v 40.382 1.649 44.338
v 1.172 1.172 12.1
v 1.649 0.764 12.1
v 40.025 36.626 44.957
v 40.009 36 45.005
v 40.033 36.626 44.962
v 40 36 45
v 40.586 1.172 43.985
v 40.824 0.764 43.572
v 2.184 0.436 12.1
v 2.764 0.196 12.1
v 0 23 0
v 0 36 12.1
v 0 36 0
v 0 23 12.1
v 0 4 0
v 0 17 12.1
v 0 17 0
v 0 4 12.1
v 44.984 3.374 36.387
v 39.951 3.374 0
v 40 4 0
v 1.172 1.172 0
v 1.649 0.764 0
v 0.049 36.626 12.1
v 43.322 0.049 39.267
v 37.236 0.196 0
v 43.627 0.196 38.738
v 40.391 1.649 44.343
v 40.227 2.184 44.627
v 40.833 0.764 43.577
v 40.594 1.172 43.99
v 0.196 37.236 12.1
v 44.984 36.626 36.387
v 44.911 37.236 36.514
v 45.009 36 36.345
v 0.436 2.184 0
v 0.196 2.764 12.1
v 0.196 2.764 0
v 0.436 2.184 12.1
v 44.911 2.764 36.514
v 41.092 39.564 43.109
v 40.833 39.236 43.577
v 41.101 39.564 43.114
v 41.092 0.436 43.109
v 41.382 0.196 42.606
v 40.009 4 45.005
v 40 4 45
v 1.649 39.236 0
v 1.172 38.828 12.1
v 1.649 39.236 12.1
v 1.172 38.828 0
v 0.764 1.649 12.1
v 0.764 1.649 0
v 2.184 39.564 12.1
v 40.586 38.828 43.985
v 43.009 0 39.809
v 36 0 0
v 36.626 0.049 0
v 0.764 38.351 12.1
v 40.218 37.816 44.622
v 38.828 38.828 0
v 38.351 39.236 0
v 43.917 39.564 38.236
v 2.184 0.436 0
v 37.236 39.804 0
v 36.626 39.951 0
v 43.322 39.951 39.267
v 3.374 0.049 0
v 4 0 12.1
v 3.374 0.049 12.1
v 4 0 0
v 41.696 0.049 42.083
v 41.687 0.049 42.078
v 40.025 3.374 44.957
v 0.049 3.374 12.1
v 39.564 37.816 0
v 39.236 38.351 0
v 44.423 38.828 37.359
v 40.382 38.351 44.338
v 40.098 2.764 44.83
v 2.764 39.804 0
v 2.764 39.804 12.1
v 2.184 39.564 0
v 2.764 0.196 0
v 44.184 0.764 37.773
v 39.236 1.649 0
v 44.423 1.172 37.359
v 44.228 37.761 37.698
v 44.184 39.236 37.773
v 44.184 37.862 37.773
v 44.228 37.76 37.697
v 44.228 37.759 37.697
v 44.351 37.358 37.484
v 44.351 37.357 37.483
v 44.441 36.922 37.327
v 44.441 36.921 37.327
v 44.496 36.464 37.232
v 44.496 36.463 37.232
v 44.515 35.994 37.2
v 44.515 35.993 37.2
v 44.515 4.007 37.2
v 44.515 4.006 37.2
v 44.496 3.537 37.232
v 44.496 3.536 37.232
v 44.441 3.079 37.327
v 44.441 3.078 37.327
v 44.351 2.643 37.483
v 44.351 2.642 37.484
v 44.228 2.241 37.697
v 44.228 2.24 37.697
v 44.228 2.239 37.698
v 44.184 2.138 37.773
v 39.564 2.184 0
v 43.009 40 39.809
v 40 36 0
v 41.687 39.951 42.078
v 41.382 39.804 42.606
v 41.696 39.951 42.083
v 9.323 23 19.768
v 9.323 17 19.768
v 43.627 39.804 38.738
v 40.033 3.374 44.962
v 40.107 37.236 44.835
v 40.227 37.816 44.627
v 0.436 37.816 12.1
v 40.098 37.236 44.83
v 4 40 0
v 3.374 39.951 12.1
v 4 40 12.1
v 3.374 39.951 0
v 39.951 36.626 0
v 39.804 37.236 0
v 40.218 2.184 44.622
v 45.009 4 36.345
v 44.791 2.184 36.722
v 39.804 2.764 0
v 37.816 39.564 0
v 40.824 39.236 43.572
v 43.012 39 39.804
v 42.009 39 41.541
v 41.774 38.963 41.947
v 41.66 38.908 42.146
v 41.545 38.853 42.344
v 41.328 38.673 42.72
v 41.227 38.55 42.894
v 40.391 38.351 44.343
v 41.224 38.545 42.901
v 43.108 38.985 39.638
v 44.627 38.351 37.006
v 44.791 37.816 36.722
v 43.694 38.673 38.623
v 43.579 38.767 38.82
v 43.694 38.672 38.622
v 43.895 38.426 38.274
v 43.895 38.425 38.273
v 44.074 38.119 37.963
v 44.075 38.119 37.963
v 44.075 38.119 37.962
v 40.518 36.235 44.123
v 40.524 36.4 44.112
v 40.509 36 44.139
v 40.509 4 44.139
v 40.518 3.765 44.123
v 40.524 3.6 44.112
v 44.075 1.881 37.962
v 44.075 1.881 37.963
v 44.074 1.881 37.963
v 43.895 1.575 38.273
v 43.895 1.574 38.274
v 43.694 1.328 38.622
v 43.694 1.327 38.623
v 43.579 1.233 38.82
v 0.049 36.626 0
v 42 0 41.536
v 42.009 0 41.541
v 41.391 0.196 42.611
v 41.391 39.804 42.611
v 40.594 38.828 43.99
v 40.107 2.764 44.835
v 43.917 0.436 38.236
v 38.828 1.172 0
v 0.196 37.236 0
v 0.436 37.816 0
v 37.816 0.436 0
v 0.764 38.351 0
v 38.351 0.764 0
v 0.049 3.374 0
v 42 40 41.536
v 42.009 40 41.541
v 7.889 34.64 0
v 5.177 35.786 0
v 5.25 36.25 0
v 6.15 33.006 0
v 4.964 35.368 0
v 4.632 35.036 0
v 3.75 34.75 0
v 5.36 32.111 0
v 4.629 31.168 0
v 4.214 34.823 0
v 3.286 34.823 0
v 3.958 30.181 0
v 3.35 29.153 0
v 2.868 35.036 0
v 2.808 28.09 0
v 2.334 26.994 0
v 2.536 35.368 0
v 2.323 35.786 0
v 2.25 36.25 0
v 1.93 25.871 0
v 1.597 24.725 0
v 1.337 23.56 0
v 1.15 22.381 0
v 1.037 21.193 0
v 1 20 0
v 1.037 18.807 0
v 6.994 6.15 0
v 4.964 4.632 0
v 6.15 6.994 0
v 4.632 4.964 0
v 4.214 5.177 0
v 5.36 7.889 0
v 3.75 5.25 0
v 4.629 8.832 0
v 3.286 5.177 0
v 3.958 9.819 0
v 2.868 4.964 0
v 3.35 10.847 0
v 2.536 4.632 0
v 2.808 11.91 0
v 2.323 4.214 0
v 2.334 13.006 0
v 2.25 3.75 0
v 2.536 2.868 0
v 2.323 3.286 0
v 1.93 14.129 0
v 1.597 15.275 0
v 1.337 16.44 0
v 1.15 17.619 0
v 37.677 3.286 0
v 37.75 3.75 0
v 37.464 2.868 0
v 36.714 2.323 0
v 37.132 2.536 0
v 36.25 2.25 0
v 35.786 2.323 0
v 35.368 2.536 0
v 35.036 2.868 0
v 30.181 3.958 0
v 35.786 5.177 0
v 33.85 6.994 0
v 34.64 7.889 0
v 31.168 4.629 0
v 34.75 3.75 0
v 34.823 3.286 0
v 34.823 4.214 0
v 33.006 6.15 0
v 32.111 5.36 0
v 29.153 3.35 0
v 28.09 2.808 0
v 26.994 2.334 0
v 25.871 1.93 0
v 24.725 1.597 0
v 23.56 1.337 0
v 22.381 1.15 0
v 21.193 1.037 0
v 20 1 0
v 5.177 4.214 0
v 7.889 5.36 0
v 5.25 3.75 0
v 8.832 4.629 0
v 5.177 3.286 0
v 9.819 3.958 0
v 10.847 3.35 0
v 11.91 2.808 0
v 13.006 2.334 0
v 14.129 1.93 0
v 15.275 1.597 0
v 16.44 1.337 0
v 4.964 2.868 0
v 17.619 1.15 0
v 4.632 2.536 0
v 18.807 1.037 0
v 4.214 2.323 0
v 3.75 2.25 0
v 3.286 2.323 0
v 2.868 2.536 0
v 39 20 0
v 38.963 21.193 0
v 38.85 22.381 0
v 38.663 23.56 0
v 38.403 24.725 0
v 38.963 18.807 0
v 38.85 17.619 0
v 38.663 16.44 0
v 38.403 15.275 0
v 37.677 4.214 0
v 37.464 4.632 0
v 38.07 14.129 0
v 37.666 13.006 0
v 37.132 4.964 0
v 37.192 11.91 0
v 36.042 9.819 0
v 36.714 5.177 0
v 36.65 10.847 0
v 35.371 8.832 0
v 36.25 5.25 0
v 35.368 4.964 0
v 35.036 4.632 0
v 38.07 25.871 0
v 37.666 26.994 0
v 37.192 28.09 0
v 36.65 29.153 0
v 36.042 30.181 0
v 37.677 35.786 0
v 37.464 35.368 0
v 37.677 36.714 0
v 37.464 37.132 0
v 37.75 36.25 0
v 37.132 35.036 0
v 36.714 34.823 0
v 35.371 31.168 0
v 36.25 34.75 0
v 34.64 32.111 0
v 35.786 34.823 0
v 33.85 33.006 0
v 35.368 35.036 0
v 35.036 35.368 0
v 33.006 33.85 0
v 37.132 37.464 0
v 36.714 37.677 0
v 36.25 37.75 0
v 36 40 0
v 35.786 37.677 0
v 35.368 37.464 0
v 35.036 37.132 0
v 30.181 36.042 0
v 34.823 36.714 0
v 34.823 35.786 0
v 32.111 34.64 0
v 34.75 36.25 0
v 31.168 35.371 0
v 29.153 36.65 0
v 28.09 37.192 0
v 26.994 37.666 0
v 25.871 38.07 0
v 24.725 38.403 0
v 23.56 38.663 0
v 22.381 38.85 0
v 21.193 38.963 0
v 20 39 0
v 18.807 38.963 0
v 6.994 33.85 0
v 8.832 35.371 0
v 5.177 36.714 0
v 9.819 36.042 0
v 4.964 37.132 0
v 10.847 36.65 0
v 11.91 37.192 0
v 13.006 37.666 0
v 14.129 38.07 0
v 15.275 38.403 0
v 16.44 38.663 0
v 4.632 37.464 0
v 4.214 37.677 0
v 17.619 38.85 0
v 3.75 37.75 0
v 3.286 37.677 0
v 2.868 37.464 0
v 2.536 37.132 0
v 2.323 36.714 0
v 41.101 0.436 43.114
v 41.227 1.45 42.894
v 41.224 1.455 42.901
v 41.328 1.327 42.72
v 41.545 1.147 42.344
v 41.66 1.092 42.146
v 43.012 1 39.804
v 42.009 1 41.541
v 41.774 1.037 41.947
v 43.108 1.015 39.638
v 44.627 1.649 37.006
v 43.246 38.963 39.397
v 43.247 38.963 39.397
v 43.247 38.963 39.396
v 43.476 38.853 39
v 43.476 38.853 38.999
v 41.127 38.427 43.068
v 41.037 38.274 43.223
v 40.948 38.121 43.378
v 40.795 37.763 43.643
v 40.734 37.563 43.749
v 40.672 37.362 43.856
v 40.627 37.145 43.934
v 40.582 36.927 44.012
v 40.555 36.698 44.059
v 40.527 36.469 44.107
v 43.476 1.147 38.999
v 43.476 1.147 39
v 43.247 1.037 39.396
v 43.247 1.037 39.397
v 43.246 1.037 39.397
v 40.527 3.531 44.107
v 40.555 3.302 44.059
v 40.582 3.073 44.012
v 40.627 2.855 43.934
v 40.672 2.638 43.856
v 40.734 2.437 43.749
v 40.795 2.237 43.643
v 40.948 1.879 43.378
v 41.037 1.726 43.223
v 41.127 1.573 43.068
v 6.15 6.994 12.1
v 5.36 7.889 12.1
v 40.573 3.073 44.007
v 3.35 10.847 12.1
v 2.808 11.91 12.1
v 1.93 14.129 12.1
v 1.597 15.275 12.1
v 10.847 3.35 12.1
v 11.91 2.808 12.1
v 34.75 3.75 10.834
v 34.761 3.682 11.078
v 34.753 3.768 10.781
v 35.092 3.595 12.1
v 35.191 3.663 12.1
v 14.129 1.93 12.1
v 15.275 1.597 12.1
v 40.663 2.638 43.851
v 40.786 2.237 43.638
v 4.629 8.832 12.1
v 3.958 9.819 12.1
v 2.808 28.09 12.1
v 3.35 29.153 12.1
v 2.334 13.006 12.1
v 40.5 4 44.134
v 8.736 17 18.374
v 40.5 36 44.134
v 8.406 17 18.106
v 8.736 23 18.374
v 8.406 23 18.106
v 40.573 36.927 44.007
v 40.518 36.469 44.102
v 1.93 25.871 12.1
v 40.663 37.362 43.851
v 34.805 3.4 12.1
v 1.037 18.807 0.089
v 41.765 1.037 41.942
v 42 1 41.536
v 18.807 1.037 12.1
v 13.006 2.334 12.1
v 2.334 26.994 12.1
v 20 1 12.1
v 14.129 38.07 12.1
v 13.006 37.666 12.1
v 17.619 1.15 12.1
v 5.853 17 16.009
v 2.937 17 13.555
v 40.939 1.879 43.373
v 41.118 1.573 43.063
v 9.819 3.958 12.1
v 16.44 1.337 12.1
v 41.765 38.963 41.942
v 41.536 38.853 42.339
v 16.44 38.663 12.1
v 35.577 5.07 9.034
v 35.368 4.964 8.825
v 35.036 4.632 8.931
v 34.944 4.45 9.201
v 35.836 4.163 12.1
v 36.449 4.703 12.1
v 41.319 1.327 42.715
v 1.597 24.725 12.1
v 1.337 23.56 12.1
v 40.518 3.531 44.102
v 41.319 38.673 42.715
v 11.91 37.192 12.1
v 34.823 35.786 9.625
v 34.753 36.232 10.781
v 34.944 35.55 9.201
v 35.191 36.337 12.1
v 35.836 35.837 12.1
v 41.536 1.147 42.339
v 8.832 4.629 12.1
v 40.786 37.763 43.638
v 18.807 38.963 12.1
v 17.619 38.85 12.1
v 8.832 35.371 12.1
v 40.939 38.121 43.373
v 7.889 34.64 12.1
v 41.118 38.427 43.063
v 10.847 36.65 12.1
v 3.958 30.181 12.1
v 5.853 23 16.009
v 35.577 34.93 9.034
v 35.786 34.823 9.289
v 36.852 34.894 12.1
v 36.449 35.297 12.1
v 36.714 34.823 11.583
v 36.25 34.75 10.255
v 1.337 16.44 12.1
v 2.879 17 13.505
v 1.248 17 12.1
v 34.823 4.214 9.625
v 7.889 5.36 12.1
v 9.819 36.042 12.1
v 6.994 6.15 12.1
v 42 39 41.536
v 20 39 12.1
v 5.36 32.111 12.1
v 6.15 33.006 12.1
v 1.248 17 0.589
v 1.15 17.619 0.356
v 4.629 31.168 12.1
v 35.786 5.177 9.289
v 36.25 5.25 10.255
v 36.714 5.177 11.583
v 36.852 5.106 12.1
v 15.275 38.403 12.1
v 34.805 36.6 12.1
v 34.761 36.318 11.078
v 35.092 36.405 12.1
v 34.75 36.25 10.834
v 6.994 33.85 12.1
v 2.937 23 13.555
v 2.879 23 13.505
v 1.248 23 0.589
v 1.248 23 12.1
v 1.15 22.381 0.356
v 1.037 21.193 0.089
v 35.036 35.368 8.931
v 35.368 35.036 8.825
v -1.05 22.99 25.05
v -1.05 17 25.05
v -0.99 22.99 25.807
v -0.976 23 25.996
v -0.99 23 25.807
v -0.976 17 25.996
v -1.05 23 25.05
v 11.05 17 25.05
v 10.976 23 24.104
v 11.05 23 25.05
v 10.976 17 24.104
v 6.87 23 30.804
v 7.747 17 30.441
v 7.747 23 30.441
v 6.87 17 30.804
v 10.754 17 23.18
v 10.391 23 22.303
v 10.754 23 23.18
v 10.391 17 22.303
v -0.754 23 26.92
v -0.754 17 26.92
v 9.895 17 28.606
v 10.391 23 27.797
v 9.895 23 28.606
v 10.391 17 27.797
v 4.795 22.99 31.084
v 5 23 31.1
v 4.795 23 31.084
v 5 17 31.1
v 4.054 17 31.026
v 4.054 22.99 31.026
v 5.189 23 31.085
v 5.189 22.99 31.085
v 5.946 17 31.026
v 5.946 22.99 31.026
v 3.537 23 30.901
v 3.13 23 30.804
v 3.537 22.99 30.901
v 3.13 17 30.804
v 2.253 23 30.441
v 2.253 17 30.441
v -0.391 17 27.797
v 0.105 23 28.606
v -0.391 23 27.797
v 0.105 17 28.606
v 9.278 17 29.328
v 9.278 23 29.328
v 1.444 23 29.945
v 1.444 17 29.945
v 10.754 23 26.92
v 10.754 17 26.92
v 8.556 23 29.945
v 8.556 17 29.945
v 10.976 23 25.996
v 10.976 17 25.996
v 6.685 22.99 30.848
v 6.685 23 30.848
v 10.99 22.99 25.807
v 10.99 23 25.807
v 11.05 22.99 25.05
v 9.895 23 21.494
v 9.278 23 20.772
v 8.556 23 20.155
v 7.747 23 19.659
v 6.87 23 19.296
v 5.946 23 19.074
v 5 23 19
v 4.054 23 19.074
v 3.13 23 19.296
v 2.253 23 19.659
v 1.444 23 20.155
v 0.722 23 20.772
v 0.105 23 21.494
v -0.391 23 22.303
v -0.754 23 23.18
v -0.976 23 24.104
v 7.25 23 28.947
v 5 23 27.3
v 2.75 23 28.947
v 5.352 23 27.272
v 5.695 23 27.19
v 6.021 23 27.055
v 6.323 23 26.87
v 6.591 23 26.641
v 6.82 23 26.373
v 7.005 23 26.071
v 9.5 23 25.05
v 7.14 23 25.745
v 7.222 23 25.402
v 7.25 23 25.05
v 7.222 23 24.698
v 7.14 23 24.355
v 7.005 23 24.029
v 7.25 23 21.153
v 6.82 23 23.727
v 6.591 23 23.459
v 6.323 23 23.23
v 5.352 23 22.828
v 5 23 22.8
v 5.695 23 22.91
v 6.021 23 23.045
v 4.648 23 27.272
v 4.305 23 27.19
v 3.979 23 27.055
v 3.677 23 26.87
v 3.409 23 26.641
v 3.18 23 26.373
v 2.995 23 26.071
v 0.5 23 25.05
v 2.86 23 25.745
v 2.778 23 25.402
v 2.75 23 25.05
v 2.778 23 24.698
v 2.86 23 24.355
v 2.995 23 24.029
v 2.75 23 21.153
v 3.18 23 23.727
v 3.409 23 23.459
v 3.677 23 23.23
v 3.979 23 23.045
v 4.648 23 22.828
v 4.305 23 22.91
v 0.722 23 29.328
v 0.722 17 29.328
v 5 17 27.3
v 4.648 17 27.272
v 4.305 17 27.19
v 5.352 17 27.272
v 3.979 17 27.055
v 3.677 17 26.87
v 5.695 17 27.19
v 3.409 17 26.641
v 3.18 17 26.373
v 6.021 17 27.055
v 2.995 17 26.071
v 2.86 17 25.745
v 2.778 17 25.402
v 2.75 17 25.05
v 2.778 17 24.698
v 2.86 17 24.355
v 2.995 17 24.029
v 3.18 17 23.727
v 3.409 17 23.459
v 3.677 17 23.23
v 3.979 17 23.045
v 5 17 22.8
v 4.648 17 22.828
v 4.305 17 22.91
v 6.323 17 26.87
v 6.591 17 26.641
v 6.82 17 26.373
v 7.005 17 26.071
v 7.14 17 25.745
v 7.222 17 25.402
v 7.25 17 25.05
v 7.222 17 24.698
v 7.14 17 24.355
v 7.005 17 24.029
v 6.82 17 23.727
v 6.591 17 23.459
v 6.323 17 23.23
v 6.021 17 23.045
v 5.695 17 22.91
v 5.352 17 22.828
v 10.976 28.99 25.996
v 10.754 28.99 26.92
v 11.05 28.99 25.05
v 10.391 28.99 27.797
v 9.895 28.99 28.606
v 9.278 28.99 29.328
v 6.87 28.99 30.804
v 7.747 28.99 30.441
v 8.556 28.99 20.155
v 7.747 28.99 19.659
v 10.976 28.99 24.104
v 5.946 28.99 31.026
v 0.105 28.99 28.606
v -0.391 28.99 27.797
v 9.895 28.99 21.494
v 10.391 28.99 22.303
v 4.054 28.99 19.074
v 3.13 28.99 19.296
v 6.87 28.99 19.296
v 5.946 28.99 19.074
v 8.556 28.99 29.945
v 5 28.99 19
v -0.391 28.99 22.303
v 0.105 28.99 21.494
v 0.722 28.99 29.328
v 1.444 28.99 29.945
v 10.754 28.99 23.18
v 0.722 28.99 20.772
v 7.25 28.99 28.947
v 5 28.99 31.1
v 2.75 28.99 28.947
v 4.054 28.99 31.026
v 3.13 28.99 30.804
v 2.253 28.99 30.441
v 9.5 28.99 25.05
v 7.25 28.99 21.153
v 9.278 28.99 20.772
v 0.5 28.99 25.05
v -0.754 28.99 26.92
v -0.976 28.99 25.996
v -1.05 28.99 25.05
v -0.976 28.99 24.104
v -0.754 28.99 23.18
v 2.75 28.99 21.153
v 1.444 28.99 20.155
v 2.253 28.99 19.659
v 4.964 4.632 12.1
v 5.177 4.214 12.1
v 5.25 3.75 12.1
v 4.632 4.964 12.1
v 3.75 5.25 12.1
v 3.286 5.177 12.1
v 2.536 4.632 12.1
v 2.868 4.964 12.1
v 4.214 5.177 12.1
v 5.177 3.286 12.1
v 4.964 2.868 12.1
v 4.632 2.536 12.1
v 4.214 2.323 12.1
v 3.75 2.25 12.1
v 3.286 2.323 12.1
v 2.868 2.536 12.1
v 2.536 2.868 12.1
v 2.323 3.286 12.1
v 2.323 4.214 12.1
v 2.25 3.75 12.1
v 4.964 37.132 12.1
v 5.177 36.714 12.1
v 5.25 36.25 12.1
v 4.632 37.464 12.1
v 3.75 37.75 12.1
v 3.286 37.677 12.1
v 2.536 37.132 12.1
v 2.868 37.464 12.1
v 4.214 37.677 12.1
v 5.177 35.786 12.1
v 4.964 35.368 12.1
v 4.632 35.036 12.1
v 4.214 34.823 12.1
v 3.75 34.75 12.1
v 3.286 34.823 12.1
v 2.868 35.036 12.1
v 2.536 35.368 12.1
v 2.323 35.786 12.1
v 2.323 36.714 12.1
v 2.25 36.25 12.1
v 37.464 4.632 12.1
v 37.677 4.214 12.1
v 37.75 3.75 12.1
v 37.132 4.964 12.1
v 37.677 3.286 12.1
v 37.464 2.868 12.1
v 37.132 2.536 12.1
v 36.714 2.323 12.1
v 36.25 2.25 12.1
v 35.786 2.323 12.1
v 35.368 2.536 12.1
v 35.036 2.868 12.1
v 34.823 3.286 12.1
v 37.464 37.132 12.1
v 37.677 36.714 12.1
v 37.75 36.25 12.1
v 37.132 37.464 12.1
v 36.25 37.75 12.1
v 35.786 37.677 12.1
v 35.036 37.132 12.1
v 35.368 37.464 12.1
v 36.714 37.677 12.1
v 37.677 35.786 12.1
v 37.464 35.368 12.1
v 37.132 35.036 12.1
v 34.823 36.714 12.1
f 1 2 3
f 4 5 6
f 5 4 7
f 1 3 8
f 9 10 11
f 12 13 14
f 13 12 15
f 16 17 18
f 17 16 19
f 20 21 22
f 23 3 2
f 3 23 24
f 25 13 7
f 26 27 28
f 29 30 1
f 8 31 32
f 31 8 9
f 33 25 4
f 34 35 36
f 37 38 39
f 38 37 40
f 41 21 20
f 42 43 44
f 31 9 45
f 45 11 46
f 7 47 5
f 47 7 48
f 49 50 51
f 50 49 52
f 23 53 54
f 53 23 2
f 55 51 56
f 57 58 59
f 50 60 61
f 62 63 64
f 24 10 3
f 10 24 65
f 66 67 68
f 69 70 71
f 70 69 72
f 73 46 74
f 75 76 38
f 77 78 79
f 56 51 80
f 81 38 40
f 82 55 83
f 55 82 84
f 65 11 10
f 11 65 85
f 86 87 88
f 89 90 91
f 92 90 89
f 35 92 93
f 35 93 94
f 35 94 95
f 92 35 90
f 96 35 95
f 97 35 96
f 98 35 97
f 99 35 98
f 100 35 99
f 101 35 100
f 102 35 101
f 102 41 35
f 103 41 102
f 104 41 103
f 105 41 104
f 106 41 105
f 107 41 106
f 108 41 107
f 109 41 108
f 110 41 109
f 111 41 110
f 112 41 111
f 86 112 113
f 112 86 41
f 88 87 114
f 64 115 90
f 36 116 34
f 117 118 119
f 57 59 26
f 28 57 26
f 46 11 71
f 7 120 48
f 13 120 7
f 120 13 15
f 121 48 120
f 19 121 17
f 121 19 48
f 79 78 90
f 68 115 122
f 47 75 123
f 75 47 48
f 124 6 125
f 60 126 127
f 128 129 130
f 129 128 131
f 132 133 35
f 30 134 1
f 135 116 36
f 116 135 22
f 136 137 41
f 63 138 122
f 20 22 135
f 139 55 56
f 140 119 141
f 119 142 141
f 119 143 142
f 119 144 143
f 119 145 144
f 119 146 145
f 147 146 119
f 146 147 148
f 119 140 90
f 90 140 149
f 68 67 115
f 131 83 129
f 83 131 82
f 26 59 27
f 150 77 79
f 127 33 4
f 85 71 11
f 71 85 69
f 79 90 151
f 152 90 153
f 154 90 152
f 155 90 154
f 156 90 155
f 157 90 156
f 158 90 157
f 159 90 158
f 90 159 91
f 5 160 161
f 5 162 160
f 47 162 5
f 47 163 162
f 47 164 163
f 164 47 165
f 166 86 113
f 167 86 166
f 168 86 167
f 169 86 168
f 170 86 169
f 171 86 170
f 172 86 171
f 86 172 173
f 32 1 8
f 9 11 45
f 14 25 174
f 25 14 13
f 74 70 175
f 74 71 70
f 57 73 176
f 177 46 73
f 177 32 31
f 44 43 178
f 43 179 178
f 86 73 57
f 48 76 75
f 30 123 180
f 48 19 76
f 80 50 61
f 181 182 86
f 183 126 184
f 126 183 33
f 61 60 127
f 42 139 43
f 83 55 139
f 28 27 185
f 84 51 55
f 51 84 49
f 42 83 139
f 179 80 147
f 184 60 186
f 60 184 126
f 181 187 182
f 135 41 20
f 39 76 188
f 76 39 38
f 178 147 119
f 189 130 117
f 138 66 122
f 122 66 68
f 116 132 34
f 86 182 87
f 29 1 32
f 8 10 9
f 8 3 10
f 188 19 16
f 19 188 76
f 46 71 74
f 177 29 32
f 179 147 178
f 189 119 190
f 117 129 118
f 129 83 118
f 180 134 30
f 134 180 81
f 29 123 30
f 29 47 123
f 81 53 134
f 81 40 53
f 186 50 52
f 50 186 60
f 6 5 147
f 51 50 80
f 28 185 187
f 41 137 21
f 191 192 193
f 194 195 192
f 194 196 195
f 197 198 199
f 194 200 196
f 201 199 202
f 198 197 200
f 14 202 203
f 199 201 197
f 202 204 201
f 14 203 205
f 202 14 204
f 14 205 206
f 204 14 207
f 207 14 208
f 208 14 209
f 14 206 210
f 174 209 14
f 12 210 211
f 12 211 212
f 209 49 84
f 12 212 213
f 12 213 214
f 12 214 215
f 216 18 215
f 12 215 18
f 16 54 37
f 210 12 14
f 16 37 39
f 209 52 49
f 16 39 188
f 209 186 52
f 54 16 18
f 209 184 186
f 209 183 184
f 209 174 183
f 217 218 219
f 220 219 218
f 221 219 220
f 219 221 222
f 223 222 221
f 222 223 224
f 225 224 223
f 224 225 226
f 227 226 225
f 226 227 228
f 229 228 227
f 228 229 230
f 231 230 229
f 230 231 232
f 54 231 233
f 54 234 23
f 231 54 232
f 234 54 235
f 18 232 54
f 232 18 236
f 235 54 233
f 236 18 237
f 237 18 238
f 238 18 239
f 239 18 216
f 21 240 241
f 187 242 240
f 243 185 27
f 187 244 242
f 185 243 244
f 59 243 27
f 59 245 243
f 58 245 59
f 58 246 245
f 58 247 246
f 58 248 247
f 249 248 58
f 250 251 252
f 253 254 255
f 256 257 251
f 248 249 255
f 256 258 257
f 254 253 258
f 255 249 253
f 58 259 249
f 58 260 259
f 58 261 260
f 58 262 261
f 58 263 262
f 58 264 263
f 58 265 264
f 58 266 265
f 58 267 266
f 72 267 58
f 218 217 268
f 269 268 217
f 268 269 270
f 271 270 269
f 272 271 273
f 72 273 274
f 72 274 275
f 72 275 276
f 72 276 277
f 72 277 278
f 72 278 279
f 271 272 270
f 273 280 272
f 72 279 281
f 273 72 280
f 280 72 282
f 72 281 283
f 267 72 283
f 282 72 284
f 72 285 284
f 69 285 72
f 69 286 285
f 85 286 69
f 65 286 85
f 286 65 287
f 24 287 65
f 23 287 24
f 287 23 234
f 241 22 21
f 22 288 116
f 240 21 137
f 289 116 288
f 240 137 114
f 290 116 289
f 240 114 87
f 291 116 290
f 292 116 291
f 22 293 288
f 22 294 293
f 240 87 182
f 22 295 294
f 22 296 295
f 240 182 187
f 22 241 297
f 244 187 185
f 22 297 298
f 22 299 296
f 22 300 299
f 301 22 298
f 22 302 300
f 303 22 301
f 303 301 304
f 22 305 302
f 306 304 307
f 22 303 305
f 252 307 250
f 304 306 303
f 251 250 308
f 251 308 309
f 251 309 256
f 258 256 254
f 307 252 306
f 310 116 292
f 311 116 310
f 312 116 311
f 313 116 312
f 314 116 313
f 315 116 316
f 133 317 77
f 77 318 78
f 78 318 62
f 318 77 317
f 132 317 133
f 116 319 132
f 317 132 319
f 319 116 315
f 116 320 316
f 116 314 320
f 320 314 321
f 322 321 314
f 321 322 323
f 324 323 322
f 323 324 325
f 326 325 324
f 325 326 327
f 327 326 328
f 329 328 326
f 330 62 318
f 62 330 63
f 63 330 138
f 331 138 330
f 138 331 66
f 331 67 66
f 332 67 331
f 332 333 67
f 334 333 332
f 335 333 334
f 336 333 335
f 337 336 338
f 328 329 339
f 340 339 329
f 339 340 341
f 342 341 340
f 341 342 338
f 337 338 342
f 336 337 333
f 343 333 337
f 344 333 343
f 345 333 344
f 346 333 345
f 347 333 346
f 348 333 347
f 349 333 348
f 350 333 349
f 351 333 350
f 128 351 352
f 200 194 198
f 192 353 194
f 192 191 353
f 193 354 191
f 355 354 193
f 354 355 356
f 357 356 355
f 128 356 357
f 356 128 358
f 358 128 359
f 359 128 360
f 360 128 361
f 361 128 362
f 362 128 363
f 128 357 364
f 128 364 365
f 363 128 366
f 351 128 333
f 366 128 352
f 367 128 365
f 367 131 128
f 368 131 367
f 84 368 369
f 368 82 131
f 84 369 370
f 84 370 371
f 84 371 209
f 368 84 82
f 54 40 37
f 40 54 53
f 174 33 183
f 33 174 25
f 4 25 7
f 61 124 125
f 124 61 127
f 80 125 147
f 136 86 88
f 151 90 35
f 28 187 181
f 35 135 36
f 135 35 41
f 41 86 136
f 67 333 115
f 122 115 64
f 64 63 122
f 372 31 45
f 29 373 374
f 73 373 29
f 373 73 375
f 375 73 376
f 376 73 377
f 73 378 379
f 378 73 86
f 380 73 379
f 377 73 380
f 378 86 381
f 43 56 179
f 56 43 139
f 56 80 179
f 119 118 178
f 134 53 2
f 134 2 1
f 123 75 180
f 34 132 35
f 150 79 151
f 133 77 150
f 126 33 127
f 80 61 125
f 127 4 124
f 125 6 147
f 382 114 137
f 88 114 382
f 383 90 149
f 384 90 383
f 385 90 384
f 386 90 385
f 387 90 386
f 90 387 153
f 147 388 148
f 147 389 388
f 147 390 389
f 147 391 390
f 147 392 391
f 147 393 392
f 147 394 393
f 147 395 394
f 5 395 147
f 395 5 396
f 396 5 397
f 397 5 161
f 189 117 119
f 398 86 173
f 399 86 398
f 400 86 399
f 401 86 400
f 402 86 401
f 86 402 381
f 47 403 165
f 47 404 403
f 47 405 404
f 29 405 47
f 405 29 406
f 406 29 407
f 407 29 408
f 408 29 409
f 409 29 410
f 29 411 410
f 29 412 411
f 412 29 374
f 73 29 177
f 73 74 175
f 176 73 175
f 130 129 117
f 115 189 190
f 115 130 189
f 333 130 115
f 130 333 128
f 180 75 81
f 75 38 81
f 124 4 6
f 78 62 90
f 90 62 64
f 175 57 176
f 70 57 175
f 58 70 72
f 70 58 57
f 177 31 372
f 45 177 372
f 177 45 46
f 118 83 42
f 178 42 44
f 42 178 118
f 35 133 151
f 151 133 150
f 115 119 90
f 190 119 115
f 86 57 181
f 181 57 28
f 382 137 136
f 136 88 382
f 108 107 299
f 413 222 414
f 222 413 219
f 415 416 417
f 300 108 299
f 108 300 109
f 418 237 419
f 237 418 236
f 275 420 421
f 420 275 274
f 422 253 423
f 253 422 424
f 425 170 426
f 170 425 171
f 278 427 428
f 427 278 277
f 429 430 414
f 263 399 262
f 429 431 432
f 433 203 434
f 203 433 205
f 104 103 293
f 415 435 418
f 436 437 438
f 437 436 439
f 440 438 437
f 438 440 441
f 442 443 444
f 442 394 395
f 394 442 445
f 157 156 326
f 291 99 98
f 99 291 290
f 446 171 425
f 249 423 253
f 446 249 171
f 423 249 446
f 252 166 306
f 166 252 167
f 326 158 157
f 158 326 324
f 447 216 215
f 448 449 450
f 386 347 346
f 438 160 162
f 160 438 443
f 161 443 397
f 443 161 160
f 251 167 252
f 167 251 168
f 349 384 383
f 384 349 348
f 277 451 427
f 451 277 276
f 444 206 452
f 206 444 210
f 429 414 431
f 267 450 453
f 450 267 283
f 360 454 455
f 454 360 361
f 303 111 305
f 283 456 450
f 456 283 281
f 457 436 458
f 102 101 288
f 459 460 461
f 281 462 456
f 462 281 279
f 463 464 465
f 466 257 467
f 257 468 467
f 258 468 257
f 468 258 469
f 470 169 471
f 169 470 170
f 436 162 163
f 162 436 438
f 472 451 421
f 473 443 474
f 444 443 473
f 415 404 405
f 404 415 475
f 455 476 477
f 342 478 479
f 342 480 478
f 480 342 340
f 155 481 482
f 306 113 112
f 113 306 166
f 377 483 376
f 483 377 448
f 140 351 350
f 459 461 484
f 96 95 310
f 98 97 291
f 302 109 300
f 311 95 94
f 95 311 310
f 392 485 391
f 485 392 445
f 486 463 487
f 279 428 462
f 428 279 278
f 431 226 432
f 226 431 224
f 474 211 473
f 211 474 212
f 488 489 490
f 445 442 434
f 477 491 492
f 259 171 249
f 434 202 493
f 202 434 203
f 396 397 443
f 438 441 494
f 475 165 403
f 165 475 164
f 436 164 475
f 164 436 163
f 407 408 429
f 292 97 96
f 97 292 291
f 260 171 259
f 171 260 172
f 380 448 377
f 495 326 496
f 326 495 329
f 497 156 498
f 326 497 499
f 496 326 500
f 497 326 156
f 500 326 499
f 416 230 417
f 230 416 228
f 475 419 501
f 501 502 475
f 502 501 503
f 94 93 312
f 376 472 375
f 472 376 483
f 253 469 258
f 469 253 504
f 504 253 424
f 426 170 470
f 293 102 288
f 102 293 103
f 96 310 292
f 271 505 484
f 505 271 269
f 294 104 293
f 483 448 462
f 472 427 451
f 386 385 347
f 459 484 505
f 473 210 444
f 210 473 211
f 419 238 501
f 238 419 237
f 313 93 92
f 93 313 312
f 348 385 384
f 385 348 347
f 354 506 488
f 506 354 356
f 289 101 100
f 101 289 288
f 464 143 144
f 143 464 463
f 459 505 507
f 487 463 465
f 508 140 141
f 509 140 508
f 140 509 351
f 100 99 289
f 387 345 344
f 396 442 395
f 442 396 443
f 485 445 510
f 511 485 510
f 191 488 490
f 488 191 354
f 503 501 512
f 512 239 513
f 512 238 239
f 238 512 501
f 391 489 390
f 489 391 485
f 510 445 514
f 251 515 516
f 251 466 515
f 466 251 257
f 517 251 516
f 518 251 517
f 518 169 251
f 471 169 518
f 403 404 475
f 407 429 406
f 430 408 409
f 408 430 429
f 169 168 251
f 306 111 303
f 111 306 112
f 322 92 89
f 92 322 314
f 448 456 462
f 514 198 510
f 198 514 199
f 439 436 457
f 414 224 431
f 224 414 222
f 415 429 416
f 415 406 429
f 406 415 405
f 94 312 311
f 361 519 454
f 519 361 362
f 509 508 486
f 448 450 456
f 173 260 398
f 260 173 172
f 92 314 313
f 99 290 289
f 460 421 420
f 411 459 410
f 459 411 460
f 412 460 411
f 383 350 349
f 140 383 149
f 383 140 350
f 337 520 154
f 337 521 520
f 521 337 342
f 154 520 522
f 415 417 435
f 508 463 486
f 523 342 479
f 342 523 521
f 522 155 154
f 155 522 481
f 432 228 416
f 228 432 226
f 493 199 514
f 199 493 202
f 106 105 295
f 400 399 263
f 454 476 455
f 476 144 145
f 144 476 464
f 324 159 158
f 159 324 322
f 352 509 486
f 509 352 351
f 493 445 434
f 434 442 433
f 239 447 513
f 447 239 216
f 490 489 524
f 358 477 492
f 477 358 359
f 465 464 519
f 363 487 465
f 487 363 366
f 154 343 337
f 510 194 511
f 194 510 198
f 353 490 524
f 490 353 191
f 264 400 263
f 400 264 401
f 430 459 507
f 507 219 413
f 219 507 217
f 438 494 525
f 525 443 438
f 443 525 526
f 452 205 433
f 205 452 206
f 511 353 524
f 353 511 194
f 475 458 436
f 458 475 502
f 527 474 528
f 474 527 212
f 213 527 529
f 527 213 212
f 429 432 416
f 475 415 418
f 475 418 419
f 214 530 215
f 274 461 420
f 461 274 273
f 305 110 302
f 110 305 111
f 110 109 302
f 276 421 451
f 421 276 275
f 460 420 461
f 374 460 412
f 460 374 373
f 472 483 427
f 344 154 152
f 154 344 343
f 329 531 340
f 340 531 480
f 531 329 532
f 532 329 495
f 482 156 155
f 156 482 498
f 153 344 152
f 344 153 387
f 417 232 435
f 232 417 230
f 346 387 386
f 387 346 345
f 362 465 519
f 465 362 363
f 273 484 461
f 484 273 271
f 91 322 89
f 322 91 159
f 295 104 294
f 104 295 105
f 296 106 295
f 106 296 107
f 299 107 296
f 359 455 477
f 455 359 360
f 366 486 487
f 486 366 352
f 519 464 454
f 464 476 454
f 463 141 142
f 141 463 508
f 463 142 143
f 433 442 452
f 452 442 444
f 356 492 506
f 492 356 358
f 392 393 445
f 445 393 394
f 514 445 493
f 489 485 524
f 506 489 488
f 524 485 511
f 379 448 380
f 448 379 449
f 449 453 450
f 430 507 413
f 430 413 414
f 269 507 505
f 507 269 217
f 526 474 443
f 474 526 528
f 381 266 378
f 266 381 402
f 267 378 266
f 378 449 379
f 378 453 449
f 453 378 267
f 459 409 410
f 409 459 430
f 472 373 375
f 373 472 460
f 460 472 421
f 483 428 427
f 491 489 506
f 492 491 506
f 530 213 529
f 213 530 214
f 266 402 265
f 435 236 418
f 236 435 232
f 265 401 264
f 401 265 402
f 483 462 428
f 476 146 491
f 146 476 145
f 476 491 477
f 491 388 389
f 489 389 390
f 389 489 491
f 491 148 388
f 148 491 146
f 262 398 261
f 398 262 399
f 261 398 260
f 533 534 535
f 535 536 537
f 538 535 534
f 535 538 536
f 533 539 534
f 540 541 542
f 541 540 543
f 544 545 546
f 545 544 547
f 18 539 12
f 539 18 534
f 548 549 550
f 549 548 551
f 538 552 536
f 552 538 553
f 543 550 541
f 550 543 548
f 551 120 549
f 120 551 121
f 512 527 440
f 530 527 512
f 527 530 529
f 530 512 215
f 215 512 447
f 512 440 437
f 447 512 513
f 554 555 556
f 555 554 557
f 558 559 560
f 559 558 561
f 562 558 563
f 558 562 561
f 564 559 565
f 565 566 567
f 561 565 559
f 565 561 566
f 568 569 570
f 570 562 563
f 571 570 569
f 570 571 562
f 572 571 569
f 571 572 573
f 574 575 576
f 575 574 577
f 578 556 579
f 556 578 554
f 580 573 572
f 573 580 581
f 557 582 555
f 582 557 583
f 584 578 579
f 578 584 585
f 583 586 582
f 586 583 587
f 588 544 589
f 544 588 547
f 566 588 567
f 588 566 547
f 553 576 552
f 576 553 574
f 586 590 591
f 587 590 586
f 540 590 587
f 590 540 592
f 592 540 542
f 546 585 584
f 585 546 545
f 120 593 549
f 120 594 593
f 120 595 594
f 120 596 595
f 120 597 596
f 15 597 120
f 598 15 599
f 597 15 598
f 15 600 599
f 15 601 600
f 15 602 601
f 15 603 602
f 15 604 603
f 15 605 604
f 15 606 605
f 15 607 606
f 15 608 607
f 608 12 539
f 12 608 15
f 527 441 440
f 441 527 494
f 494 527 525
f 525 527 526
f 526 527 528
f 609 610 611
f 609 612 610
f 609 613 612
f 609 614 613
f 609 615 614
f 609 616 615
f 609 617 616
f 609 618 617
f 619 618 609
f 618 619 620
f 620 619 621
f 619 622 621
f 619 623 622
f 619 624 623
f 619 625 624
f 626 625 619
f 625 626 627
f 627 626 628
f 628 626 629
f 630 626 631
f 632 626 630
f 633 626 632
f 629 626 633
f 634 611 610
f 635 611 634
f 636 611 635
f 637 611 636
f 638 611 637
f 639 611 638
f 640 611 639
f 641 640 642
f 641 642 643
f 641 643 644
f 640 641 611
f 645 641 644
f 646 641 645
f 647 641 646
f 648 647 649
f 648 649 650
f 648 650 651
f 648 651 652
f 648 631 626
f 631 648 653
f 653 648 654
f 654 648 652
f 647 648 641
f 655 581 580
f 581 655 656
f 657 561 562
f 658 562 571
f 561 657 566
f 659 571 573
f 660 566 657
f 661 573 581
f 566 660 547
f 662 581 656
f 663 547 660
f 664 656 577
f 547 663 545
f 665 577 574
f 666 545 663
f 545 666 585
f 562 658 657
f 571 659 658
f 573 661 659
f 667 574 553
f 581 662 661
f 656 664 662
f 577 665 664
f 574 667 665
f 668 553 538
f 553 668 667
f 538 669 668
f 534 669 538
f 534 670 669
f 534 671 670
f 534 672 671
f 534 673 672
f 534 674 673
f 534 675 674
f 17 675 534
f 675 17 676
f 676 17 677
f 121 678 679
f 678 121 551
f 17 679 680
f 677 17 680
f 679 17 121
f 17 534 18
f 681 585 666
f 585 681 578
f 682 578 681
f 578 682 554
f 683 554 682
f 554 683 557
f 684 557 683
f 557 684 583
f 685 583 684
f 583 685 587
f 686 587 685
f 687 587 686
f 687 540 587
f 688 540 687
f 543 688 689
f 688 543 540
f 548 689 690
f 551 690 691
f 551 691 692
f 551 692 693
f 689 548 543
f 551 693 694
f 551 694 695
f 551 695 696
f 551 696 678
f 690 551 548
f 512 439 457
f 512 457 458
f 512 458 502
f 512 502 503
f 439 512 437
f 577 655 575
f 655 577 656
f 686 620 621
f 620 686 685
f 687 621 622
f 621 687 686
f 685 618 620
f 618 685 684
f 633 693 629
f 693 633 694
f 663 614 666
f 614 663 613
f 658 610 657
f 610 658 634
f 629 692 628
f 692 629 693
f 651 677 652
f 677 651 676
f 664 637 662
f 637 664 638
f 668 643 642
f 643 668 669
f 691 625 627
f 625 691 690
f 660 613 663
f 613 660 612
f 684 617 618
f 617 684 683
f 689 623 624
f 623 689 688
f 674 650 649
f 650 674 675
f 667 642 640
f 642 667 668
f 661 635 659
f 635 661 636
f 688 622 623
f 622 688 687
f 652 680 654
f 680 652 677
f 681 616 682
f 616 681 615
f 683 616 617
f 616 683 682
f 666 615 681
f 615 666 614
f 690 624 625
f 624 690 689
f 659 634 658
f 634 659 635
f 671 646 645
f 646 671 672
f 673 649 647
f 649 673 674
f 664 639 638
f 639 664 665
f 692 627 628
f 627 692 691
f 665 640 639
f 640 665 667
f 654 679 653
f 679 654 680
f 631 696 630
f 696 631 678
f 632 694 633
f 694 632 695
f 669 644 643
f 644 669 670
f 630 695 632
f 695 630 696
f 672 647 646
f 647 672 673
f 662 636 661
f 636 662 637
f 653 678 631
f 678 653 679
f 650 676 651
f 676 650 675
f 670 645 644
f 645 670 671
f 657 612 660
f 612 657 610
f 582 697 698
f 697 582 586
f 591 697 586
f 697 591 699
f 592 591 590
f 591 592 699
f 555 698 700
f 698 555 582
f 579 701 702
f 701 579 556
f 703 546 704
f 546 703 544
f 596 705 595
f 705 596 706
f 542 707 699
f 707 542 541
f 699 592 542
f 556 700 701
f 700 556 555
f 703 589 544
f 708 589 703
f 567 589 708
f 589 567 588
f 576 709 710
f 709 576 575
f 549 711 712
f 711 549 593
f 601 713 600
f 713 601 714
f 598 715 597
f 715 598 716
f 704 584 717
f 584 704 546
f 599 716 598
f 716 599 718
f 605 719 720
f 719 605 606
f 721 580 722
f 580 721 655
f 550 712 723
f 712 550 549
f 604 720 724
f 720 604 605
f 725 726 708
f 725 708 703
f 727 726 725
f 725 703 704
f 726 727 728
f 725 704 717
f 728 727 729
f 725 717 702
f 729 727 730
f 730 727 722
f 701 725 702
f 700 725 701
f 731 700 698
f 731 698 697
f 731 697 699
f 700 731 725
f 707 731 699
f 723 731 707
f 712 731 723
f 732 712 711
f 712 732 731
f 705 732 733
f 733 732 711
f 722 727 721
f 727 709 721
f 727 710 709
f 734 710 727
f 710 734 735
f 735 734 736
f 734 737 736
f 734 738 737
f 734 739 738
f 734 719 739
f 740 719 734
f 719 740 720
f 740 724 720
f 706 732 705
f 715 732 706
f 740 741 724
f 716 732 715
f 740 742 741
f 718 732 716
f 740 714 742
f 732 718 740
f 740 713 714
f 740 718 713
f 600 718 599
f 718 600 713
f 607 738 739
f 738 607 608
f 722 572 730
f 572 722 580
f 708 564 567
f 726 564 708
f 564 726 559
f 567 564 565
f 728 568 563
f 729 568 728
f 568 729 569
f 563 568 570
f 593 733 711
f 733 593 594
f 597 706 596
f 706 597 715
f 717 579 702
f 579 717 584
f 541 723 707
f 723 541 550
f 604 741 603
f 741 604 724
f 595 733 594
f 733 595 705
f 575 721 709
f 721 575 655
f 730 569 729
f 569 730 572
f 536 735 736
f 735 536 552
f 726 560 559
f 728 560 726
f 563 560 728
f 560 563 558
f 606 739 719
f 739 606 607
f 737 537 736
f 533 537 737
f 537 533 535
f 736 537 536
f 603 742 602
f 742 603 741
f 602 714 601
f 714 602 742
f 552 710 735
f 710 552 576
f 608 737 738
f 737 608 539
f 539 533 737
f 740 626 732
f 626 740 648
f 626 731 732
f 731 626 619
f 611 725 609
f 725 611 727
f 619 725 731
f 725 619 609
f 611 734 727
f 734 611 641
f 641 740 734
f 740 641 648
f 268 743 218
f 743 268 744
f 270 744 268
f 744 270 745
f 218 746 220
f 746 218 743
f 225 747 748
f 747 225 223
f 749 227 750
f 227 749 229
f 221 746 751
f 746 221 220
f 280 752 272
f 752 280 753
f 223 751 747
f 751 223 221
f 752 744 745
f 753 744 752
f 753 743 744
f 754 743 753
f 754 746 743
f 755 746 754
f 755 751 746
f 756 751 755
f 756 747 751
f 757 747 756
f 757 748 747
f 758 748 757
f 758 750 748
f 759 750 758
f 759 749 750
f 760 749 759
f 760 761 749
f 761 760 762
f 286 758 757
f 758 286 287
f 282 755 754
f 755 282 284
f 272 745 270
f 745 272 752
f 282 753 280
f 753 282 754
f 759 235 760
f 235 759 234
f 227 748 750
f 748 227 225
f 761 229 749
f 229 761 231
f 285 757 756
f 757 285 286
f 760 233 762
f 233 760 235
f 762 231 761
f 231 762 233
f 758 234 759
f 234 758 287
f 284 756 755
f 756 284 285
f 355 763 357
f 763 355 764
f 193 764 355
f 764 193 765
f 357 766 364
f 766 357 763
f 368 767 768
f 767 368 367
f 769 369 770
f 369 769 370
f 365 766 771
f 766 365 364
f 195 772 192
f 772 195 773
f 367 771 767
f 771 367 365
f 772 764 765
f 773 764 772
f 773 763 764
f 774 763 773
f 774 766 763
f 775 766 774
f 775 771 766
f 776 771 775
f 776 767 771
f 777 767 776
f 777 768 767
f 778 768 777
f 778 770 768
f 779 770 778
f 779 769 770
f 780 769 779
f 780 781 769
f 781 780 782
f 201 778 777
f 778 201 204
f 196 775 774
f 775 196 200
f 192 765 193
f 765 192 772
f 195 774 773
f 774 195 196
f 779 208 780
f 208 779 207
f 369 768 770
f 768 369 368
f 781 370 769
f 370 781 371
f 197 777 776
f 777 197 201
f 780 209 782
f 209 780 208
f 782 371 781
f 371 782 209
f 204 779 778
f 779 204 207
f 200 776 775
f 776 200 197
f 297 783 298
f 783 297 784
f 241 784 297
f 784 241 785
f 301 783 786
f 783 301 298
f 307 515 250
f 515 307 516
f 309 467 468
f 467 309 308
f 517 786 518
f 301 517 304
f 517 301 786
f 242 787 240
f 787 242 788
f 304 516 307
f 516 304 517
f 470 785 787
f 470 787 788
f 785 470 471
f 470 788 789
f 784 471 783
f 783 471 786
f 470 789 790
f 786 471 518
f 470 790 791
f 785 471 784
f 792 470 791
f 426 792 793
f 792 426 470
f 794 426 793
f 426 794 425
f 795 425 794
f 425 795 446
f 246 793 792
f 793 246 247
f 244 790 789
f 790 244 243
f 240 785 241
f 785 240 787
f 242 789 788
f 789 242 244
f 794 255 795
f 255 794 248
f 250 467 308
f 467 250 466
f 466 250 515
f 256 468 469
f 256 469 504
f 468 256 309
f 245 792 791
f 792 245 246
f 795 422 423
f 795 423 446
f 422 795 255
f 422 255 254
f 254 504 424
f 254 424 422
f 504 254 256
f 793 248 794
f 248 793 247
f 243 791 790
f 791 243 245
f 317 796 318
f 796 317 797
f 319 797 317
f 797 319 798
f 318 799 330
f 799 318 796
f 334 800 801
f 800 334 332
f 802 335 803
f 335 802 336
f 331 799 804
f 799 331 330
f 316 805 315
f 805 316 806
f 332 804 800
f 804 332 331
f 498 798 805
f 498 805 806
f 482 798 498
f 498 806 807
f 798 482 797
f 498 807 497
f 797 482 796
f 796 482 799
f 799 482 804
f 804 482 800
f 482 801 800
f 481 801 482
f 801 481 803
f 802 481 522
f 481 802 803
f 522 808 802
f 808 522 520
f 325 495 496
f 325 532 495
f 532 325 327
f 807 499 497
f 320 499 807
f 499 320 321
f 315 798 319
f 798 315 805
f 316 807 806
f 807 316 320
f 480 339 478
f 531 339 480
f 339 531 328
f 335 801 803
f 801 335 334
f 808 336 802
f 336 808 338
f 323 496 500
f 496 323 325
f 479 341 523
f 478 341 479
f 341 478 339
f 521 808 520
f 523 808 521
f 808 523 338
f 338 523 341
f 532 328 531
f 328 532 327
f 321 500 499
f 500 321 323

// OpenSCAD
//all();
//holder_simple();
//holder_clamp();
//fan_mount();
fan_duct();

fan_size      = 40; // [30:10:120]
fan_drill_dist= 32.5; // [30:0.5:120]
fan_drill     =  3; // [2:0.1:6]
channel_len   = 45; // [30:1:100]
channel_open  = 10; // [2:1:20]
channel_wall  =  1; // [0.4:0.1:2]
channel_round =  4; // [2:1:10]
channel_shift = 40; // [-20:1:120]
channel_rotate = 60; // [-30:1:30]

// on very low values of x a higher z is required
fan_mount_offset_x = -5; // [-10:1:30]
fan_mount_offset_z = 19; // [0:1:30]

holder_height = 12.1; // [10:1:30]
holder_wall   =  6.0; // [3.5:0.5:8]
holder_drill  =  4.5; // [3.5:0.5:5.5]

holder_simple_drill           =  3.5; // [2:0.1:5]
holder_simple_drill_distance  = 23;   // [15:1:50]

holder_clamp_width = 40; // [20:1:60]
holder_clamp_len   = 15; // [10:1:30]
holder_clamp_gap   =  3; // [1:0.1:5]
holder_clamp_drill =  4.5; // [2:0.1:6]

holder_nut=true; // [true,false]
holder_nut_dia = 8.5; // [3:30]
gap = 0.5; // [0:0.1:1]
selector = "all"; // [all,holder simple,holder clamp,fan duct]


//echo ( someparam ) ;

//function rnd(a=1,b=0)=(rands(min(a,b),max(a,b),1)[0]);

module all()
{
    if(selector == "all" || selector == "fan duct")
        fan_duct();
    if(selector == "all" || selector == "holder simple")
        translate([-25,0,0]) mirror([1,0,0]) holder_simple();
    if(selector == "all" || selector == "holder clamp")
        translate([-45,0,0]) mirror([1,0,0]) holder_clamp();
}

module fan_mount()
{
    $fn=40;
    difference()
    {
        hull()
        {
            translate([0,-holder_wall/2,0]) 
                cube([1,holder_wall,holder_height]);
            translate([-fan_mount_offset_x,0,holder_height/2+fan_mount_offset_z]) 
                rotate([90,0,0]) 
                   cylinder(d=holder_height, h=holder_wall, center=true);
        }
        // screw drill
        translate([-fan_mount_offset_x,0,holder_height/2+fan_mount_offset_z]) 
            rotate([90,0,0]) 
                cylinder(d=holder_drill, h=holder_wall+0.01, center=true);
    }
	if(holder_nut)
    {
        translate([-fan_mount_offset_x,holder_wall-0.01,holder_height/2+fan_mount_offset_z]) 
            rotate([90,0,0]) 
                color ("red") holder_nut();
    }
}

module holder_nut()
{
    difference()
    {
        cylinder(d=holder_height, h=holder_wall, center=true);
        cylinder(d=holder_nut_dia+gap, h=holder_wall, center=true, $fn=6);
    }
}

module fan_duct()
{
    difference()
    {
        union()
        {
            fan_duct_channel();
            translate([0,fan_size/2,0]) fan_mount();
        }
        fan_duct_drills();
    }
}

module holder_simple()
{
    $fn=40;
    
    translate([0,(holder_simple_drill_distance+10)/2,0]) fan_mount();
    difference()
    {
        // base plate
        cube([holder_wall,holder_simple_drill_distance+10,holder_height]);
        // drills inkl counter sunk
        // drill
        translate([0,5,holder_height/2]) rotate([0,90,0]) 
            cylinder(d=holder_simple_drill, h=holder_wall);
        // counter sunk
        translate([0,5,holder_height/2]) rotate([0,90,0]) 
            cylinder(d1=2*holder_simple_drill, d2=0, h=2*holder_simple_drill);
        // drill 
        translate([0,holder_simple_drill_distance+5,holder_height/2]) 
            rotate([0,90,0]) cylinder(d=holder_simple_drill, h=holder_wall);
        // counter sunk
        translate([0,holder_simple_drill_distance+5,holder_height/2]) 
            rotate([0,90,0]) cylinder(d1=2*holder_simple_drill, d2=0, h=2*holder_simple_drill);
    }
}

module holder_clamp()
{
    translate([0,holder_clamp_width/2,0]) fan_mount();
    clamp();
}

module clamp()
{
    $fn=20;
    
    difference()
    {
        // connector and clamp
        hull()
        {
            translate([0,(holder_clamp_width-holder_wall)/2,0]) 
                cube([holder_wall,holder_wall,holder_height]);
            translate([holder_wall,0,0]) 
                cube([holder_clamp_len,holder_clamp_width,holder_height]);
        }
        // clamp cut
        translate([holder_wall+1,0,(holder_height-holder_clamp_gap)/2]) 
            cube([holder_clamp_len-1,holder_clamp_width,holder_clamp_gap]);
        // drill
        translate([holder_wall+holder_clamp_len-5,holder_clamp_width/2,0]) 
            cylinder(d=holder_clamp_drill, h=holder_height);
    }
    translate([holder_wall+holder_clamp_len-5,holder_clamp_width/2,holder_height+holder_wall/2]) rotate([0,0,30]) holder_nut();
}

module fan_duct_drills()
{
    s1 = (fan_size-fan_drill_dist)/2;
    s2 = (fan_size-fan_drill_dist)/2+fan_drill_dist;
    $fn=20;
    
    // drills
    translate([s1,s1,0]) cylinder(d=fan_drill, h=holder_height);
    translate([s1,s2,0]) cylinder(d=fan_drill, h=holder_height);
    translate([s2,s1,0]) cylinder(d=fan_drill, h=holder_height);
    translate([s2,s2,0]) cylinder(d=fan_drill, h=holder_height);
}

module fan_duct_channel()
{
    $fn=40;
    
    difference()
    {
        // outer channel
        hull()
         {
            rounded_cube([fan_size,fan_size,holder_height], rCorner=channel_round, dimensions=2);
            translate([channel_shift,0,channel_len]) 
                rotate([0,channel_rotate,0]) 
            rounded_cube([channel_open, fan_size,0.01], rCorner=channel_round, dimensions=2);
        }
        
        // inner channel
        hull()
        {
            translate([fan_size/2,fan_size/2,0])
                cylinder(r=fan_size/2-channel_wall, h=holder_height, $fn=100);
            translate([channel_shift,channel_wall,channel_len]) 
                rotate([0,channel_rotate,0]) translate([channel_wall,0,0])
            rounded_cube([channel_open-2*channel_wall, fan_size-2*channel_wall,0.02], rCorner=channel_round-channel_wall, dimensions=2);
        }
    }
}

/**********************************************************************/
/******************** required to work in customizer ******************/
/** uncomment "use <salvador_richter_primitives.scad>" for local use **/
/**********************************************************************/

/*
 * cube with rounded edges and corners, depends on param dimensions
 * dimensions 2:   4 edges rounded
 * dimensions 3: all edges rounded corners as well
 */
module rounded_cube(outerCube, rCorner, dimensions=3)
{
    hull()
    {
        for(xPos = [rCorner,outerCube[0]-rCorner])
        {
            for(yPos = [rCorner,outerCube[1]-rCorner])
            {
                if(dimensions==2)
                {
                    translate([xPos,yPos,0]) cylinder(r=rCorner, h=outerCube[2]);
                }
                if(dimensions==3)
                {
                    for(zPos = [rCorner,outerCube[2]-rCorner])
                    {
                        translate([xPos,yPos,zPos]) sphere(r=rCorner);
                    }
                }
            }
        }
    }
}

/*
 * hollow cube, rounded edges only, what else? check param names
 */
module hollow_rounded_cube(outerCube, rCorner, wall, lid=true, bottom=true)
{
    w2 = wall*2;
    innerCube=[outerCube[0]-w2,
               outerCube[1]-w2,
               outerCube[2]-addDelta(wall,-wall,!lid)-addDelta(wall,-wall,!bottom)];
    difference()
    {
        rounded_cube(outerCube, rCorner, dimensions=2);
        translate([wall,wall,addDelta(wall,-wall,!bottom)+0.0001]) 
            rounded_cube(innerCube, rCorner-wall, dimensions=2);
    }
}

function addDelta(value, delta, add=true) = (add==true) ? value+delta : value;
